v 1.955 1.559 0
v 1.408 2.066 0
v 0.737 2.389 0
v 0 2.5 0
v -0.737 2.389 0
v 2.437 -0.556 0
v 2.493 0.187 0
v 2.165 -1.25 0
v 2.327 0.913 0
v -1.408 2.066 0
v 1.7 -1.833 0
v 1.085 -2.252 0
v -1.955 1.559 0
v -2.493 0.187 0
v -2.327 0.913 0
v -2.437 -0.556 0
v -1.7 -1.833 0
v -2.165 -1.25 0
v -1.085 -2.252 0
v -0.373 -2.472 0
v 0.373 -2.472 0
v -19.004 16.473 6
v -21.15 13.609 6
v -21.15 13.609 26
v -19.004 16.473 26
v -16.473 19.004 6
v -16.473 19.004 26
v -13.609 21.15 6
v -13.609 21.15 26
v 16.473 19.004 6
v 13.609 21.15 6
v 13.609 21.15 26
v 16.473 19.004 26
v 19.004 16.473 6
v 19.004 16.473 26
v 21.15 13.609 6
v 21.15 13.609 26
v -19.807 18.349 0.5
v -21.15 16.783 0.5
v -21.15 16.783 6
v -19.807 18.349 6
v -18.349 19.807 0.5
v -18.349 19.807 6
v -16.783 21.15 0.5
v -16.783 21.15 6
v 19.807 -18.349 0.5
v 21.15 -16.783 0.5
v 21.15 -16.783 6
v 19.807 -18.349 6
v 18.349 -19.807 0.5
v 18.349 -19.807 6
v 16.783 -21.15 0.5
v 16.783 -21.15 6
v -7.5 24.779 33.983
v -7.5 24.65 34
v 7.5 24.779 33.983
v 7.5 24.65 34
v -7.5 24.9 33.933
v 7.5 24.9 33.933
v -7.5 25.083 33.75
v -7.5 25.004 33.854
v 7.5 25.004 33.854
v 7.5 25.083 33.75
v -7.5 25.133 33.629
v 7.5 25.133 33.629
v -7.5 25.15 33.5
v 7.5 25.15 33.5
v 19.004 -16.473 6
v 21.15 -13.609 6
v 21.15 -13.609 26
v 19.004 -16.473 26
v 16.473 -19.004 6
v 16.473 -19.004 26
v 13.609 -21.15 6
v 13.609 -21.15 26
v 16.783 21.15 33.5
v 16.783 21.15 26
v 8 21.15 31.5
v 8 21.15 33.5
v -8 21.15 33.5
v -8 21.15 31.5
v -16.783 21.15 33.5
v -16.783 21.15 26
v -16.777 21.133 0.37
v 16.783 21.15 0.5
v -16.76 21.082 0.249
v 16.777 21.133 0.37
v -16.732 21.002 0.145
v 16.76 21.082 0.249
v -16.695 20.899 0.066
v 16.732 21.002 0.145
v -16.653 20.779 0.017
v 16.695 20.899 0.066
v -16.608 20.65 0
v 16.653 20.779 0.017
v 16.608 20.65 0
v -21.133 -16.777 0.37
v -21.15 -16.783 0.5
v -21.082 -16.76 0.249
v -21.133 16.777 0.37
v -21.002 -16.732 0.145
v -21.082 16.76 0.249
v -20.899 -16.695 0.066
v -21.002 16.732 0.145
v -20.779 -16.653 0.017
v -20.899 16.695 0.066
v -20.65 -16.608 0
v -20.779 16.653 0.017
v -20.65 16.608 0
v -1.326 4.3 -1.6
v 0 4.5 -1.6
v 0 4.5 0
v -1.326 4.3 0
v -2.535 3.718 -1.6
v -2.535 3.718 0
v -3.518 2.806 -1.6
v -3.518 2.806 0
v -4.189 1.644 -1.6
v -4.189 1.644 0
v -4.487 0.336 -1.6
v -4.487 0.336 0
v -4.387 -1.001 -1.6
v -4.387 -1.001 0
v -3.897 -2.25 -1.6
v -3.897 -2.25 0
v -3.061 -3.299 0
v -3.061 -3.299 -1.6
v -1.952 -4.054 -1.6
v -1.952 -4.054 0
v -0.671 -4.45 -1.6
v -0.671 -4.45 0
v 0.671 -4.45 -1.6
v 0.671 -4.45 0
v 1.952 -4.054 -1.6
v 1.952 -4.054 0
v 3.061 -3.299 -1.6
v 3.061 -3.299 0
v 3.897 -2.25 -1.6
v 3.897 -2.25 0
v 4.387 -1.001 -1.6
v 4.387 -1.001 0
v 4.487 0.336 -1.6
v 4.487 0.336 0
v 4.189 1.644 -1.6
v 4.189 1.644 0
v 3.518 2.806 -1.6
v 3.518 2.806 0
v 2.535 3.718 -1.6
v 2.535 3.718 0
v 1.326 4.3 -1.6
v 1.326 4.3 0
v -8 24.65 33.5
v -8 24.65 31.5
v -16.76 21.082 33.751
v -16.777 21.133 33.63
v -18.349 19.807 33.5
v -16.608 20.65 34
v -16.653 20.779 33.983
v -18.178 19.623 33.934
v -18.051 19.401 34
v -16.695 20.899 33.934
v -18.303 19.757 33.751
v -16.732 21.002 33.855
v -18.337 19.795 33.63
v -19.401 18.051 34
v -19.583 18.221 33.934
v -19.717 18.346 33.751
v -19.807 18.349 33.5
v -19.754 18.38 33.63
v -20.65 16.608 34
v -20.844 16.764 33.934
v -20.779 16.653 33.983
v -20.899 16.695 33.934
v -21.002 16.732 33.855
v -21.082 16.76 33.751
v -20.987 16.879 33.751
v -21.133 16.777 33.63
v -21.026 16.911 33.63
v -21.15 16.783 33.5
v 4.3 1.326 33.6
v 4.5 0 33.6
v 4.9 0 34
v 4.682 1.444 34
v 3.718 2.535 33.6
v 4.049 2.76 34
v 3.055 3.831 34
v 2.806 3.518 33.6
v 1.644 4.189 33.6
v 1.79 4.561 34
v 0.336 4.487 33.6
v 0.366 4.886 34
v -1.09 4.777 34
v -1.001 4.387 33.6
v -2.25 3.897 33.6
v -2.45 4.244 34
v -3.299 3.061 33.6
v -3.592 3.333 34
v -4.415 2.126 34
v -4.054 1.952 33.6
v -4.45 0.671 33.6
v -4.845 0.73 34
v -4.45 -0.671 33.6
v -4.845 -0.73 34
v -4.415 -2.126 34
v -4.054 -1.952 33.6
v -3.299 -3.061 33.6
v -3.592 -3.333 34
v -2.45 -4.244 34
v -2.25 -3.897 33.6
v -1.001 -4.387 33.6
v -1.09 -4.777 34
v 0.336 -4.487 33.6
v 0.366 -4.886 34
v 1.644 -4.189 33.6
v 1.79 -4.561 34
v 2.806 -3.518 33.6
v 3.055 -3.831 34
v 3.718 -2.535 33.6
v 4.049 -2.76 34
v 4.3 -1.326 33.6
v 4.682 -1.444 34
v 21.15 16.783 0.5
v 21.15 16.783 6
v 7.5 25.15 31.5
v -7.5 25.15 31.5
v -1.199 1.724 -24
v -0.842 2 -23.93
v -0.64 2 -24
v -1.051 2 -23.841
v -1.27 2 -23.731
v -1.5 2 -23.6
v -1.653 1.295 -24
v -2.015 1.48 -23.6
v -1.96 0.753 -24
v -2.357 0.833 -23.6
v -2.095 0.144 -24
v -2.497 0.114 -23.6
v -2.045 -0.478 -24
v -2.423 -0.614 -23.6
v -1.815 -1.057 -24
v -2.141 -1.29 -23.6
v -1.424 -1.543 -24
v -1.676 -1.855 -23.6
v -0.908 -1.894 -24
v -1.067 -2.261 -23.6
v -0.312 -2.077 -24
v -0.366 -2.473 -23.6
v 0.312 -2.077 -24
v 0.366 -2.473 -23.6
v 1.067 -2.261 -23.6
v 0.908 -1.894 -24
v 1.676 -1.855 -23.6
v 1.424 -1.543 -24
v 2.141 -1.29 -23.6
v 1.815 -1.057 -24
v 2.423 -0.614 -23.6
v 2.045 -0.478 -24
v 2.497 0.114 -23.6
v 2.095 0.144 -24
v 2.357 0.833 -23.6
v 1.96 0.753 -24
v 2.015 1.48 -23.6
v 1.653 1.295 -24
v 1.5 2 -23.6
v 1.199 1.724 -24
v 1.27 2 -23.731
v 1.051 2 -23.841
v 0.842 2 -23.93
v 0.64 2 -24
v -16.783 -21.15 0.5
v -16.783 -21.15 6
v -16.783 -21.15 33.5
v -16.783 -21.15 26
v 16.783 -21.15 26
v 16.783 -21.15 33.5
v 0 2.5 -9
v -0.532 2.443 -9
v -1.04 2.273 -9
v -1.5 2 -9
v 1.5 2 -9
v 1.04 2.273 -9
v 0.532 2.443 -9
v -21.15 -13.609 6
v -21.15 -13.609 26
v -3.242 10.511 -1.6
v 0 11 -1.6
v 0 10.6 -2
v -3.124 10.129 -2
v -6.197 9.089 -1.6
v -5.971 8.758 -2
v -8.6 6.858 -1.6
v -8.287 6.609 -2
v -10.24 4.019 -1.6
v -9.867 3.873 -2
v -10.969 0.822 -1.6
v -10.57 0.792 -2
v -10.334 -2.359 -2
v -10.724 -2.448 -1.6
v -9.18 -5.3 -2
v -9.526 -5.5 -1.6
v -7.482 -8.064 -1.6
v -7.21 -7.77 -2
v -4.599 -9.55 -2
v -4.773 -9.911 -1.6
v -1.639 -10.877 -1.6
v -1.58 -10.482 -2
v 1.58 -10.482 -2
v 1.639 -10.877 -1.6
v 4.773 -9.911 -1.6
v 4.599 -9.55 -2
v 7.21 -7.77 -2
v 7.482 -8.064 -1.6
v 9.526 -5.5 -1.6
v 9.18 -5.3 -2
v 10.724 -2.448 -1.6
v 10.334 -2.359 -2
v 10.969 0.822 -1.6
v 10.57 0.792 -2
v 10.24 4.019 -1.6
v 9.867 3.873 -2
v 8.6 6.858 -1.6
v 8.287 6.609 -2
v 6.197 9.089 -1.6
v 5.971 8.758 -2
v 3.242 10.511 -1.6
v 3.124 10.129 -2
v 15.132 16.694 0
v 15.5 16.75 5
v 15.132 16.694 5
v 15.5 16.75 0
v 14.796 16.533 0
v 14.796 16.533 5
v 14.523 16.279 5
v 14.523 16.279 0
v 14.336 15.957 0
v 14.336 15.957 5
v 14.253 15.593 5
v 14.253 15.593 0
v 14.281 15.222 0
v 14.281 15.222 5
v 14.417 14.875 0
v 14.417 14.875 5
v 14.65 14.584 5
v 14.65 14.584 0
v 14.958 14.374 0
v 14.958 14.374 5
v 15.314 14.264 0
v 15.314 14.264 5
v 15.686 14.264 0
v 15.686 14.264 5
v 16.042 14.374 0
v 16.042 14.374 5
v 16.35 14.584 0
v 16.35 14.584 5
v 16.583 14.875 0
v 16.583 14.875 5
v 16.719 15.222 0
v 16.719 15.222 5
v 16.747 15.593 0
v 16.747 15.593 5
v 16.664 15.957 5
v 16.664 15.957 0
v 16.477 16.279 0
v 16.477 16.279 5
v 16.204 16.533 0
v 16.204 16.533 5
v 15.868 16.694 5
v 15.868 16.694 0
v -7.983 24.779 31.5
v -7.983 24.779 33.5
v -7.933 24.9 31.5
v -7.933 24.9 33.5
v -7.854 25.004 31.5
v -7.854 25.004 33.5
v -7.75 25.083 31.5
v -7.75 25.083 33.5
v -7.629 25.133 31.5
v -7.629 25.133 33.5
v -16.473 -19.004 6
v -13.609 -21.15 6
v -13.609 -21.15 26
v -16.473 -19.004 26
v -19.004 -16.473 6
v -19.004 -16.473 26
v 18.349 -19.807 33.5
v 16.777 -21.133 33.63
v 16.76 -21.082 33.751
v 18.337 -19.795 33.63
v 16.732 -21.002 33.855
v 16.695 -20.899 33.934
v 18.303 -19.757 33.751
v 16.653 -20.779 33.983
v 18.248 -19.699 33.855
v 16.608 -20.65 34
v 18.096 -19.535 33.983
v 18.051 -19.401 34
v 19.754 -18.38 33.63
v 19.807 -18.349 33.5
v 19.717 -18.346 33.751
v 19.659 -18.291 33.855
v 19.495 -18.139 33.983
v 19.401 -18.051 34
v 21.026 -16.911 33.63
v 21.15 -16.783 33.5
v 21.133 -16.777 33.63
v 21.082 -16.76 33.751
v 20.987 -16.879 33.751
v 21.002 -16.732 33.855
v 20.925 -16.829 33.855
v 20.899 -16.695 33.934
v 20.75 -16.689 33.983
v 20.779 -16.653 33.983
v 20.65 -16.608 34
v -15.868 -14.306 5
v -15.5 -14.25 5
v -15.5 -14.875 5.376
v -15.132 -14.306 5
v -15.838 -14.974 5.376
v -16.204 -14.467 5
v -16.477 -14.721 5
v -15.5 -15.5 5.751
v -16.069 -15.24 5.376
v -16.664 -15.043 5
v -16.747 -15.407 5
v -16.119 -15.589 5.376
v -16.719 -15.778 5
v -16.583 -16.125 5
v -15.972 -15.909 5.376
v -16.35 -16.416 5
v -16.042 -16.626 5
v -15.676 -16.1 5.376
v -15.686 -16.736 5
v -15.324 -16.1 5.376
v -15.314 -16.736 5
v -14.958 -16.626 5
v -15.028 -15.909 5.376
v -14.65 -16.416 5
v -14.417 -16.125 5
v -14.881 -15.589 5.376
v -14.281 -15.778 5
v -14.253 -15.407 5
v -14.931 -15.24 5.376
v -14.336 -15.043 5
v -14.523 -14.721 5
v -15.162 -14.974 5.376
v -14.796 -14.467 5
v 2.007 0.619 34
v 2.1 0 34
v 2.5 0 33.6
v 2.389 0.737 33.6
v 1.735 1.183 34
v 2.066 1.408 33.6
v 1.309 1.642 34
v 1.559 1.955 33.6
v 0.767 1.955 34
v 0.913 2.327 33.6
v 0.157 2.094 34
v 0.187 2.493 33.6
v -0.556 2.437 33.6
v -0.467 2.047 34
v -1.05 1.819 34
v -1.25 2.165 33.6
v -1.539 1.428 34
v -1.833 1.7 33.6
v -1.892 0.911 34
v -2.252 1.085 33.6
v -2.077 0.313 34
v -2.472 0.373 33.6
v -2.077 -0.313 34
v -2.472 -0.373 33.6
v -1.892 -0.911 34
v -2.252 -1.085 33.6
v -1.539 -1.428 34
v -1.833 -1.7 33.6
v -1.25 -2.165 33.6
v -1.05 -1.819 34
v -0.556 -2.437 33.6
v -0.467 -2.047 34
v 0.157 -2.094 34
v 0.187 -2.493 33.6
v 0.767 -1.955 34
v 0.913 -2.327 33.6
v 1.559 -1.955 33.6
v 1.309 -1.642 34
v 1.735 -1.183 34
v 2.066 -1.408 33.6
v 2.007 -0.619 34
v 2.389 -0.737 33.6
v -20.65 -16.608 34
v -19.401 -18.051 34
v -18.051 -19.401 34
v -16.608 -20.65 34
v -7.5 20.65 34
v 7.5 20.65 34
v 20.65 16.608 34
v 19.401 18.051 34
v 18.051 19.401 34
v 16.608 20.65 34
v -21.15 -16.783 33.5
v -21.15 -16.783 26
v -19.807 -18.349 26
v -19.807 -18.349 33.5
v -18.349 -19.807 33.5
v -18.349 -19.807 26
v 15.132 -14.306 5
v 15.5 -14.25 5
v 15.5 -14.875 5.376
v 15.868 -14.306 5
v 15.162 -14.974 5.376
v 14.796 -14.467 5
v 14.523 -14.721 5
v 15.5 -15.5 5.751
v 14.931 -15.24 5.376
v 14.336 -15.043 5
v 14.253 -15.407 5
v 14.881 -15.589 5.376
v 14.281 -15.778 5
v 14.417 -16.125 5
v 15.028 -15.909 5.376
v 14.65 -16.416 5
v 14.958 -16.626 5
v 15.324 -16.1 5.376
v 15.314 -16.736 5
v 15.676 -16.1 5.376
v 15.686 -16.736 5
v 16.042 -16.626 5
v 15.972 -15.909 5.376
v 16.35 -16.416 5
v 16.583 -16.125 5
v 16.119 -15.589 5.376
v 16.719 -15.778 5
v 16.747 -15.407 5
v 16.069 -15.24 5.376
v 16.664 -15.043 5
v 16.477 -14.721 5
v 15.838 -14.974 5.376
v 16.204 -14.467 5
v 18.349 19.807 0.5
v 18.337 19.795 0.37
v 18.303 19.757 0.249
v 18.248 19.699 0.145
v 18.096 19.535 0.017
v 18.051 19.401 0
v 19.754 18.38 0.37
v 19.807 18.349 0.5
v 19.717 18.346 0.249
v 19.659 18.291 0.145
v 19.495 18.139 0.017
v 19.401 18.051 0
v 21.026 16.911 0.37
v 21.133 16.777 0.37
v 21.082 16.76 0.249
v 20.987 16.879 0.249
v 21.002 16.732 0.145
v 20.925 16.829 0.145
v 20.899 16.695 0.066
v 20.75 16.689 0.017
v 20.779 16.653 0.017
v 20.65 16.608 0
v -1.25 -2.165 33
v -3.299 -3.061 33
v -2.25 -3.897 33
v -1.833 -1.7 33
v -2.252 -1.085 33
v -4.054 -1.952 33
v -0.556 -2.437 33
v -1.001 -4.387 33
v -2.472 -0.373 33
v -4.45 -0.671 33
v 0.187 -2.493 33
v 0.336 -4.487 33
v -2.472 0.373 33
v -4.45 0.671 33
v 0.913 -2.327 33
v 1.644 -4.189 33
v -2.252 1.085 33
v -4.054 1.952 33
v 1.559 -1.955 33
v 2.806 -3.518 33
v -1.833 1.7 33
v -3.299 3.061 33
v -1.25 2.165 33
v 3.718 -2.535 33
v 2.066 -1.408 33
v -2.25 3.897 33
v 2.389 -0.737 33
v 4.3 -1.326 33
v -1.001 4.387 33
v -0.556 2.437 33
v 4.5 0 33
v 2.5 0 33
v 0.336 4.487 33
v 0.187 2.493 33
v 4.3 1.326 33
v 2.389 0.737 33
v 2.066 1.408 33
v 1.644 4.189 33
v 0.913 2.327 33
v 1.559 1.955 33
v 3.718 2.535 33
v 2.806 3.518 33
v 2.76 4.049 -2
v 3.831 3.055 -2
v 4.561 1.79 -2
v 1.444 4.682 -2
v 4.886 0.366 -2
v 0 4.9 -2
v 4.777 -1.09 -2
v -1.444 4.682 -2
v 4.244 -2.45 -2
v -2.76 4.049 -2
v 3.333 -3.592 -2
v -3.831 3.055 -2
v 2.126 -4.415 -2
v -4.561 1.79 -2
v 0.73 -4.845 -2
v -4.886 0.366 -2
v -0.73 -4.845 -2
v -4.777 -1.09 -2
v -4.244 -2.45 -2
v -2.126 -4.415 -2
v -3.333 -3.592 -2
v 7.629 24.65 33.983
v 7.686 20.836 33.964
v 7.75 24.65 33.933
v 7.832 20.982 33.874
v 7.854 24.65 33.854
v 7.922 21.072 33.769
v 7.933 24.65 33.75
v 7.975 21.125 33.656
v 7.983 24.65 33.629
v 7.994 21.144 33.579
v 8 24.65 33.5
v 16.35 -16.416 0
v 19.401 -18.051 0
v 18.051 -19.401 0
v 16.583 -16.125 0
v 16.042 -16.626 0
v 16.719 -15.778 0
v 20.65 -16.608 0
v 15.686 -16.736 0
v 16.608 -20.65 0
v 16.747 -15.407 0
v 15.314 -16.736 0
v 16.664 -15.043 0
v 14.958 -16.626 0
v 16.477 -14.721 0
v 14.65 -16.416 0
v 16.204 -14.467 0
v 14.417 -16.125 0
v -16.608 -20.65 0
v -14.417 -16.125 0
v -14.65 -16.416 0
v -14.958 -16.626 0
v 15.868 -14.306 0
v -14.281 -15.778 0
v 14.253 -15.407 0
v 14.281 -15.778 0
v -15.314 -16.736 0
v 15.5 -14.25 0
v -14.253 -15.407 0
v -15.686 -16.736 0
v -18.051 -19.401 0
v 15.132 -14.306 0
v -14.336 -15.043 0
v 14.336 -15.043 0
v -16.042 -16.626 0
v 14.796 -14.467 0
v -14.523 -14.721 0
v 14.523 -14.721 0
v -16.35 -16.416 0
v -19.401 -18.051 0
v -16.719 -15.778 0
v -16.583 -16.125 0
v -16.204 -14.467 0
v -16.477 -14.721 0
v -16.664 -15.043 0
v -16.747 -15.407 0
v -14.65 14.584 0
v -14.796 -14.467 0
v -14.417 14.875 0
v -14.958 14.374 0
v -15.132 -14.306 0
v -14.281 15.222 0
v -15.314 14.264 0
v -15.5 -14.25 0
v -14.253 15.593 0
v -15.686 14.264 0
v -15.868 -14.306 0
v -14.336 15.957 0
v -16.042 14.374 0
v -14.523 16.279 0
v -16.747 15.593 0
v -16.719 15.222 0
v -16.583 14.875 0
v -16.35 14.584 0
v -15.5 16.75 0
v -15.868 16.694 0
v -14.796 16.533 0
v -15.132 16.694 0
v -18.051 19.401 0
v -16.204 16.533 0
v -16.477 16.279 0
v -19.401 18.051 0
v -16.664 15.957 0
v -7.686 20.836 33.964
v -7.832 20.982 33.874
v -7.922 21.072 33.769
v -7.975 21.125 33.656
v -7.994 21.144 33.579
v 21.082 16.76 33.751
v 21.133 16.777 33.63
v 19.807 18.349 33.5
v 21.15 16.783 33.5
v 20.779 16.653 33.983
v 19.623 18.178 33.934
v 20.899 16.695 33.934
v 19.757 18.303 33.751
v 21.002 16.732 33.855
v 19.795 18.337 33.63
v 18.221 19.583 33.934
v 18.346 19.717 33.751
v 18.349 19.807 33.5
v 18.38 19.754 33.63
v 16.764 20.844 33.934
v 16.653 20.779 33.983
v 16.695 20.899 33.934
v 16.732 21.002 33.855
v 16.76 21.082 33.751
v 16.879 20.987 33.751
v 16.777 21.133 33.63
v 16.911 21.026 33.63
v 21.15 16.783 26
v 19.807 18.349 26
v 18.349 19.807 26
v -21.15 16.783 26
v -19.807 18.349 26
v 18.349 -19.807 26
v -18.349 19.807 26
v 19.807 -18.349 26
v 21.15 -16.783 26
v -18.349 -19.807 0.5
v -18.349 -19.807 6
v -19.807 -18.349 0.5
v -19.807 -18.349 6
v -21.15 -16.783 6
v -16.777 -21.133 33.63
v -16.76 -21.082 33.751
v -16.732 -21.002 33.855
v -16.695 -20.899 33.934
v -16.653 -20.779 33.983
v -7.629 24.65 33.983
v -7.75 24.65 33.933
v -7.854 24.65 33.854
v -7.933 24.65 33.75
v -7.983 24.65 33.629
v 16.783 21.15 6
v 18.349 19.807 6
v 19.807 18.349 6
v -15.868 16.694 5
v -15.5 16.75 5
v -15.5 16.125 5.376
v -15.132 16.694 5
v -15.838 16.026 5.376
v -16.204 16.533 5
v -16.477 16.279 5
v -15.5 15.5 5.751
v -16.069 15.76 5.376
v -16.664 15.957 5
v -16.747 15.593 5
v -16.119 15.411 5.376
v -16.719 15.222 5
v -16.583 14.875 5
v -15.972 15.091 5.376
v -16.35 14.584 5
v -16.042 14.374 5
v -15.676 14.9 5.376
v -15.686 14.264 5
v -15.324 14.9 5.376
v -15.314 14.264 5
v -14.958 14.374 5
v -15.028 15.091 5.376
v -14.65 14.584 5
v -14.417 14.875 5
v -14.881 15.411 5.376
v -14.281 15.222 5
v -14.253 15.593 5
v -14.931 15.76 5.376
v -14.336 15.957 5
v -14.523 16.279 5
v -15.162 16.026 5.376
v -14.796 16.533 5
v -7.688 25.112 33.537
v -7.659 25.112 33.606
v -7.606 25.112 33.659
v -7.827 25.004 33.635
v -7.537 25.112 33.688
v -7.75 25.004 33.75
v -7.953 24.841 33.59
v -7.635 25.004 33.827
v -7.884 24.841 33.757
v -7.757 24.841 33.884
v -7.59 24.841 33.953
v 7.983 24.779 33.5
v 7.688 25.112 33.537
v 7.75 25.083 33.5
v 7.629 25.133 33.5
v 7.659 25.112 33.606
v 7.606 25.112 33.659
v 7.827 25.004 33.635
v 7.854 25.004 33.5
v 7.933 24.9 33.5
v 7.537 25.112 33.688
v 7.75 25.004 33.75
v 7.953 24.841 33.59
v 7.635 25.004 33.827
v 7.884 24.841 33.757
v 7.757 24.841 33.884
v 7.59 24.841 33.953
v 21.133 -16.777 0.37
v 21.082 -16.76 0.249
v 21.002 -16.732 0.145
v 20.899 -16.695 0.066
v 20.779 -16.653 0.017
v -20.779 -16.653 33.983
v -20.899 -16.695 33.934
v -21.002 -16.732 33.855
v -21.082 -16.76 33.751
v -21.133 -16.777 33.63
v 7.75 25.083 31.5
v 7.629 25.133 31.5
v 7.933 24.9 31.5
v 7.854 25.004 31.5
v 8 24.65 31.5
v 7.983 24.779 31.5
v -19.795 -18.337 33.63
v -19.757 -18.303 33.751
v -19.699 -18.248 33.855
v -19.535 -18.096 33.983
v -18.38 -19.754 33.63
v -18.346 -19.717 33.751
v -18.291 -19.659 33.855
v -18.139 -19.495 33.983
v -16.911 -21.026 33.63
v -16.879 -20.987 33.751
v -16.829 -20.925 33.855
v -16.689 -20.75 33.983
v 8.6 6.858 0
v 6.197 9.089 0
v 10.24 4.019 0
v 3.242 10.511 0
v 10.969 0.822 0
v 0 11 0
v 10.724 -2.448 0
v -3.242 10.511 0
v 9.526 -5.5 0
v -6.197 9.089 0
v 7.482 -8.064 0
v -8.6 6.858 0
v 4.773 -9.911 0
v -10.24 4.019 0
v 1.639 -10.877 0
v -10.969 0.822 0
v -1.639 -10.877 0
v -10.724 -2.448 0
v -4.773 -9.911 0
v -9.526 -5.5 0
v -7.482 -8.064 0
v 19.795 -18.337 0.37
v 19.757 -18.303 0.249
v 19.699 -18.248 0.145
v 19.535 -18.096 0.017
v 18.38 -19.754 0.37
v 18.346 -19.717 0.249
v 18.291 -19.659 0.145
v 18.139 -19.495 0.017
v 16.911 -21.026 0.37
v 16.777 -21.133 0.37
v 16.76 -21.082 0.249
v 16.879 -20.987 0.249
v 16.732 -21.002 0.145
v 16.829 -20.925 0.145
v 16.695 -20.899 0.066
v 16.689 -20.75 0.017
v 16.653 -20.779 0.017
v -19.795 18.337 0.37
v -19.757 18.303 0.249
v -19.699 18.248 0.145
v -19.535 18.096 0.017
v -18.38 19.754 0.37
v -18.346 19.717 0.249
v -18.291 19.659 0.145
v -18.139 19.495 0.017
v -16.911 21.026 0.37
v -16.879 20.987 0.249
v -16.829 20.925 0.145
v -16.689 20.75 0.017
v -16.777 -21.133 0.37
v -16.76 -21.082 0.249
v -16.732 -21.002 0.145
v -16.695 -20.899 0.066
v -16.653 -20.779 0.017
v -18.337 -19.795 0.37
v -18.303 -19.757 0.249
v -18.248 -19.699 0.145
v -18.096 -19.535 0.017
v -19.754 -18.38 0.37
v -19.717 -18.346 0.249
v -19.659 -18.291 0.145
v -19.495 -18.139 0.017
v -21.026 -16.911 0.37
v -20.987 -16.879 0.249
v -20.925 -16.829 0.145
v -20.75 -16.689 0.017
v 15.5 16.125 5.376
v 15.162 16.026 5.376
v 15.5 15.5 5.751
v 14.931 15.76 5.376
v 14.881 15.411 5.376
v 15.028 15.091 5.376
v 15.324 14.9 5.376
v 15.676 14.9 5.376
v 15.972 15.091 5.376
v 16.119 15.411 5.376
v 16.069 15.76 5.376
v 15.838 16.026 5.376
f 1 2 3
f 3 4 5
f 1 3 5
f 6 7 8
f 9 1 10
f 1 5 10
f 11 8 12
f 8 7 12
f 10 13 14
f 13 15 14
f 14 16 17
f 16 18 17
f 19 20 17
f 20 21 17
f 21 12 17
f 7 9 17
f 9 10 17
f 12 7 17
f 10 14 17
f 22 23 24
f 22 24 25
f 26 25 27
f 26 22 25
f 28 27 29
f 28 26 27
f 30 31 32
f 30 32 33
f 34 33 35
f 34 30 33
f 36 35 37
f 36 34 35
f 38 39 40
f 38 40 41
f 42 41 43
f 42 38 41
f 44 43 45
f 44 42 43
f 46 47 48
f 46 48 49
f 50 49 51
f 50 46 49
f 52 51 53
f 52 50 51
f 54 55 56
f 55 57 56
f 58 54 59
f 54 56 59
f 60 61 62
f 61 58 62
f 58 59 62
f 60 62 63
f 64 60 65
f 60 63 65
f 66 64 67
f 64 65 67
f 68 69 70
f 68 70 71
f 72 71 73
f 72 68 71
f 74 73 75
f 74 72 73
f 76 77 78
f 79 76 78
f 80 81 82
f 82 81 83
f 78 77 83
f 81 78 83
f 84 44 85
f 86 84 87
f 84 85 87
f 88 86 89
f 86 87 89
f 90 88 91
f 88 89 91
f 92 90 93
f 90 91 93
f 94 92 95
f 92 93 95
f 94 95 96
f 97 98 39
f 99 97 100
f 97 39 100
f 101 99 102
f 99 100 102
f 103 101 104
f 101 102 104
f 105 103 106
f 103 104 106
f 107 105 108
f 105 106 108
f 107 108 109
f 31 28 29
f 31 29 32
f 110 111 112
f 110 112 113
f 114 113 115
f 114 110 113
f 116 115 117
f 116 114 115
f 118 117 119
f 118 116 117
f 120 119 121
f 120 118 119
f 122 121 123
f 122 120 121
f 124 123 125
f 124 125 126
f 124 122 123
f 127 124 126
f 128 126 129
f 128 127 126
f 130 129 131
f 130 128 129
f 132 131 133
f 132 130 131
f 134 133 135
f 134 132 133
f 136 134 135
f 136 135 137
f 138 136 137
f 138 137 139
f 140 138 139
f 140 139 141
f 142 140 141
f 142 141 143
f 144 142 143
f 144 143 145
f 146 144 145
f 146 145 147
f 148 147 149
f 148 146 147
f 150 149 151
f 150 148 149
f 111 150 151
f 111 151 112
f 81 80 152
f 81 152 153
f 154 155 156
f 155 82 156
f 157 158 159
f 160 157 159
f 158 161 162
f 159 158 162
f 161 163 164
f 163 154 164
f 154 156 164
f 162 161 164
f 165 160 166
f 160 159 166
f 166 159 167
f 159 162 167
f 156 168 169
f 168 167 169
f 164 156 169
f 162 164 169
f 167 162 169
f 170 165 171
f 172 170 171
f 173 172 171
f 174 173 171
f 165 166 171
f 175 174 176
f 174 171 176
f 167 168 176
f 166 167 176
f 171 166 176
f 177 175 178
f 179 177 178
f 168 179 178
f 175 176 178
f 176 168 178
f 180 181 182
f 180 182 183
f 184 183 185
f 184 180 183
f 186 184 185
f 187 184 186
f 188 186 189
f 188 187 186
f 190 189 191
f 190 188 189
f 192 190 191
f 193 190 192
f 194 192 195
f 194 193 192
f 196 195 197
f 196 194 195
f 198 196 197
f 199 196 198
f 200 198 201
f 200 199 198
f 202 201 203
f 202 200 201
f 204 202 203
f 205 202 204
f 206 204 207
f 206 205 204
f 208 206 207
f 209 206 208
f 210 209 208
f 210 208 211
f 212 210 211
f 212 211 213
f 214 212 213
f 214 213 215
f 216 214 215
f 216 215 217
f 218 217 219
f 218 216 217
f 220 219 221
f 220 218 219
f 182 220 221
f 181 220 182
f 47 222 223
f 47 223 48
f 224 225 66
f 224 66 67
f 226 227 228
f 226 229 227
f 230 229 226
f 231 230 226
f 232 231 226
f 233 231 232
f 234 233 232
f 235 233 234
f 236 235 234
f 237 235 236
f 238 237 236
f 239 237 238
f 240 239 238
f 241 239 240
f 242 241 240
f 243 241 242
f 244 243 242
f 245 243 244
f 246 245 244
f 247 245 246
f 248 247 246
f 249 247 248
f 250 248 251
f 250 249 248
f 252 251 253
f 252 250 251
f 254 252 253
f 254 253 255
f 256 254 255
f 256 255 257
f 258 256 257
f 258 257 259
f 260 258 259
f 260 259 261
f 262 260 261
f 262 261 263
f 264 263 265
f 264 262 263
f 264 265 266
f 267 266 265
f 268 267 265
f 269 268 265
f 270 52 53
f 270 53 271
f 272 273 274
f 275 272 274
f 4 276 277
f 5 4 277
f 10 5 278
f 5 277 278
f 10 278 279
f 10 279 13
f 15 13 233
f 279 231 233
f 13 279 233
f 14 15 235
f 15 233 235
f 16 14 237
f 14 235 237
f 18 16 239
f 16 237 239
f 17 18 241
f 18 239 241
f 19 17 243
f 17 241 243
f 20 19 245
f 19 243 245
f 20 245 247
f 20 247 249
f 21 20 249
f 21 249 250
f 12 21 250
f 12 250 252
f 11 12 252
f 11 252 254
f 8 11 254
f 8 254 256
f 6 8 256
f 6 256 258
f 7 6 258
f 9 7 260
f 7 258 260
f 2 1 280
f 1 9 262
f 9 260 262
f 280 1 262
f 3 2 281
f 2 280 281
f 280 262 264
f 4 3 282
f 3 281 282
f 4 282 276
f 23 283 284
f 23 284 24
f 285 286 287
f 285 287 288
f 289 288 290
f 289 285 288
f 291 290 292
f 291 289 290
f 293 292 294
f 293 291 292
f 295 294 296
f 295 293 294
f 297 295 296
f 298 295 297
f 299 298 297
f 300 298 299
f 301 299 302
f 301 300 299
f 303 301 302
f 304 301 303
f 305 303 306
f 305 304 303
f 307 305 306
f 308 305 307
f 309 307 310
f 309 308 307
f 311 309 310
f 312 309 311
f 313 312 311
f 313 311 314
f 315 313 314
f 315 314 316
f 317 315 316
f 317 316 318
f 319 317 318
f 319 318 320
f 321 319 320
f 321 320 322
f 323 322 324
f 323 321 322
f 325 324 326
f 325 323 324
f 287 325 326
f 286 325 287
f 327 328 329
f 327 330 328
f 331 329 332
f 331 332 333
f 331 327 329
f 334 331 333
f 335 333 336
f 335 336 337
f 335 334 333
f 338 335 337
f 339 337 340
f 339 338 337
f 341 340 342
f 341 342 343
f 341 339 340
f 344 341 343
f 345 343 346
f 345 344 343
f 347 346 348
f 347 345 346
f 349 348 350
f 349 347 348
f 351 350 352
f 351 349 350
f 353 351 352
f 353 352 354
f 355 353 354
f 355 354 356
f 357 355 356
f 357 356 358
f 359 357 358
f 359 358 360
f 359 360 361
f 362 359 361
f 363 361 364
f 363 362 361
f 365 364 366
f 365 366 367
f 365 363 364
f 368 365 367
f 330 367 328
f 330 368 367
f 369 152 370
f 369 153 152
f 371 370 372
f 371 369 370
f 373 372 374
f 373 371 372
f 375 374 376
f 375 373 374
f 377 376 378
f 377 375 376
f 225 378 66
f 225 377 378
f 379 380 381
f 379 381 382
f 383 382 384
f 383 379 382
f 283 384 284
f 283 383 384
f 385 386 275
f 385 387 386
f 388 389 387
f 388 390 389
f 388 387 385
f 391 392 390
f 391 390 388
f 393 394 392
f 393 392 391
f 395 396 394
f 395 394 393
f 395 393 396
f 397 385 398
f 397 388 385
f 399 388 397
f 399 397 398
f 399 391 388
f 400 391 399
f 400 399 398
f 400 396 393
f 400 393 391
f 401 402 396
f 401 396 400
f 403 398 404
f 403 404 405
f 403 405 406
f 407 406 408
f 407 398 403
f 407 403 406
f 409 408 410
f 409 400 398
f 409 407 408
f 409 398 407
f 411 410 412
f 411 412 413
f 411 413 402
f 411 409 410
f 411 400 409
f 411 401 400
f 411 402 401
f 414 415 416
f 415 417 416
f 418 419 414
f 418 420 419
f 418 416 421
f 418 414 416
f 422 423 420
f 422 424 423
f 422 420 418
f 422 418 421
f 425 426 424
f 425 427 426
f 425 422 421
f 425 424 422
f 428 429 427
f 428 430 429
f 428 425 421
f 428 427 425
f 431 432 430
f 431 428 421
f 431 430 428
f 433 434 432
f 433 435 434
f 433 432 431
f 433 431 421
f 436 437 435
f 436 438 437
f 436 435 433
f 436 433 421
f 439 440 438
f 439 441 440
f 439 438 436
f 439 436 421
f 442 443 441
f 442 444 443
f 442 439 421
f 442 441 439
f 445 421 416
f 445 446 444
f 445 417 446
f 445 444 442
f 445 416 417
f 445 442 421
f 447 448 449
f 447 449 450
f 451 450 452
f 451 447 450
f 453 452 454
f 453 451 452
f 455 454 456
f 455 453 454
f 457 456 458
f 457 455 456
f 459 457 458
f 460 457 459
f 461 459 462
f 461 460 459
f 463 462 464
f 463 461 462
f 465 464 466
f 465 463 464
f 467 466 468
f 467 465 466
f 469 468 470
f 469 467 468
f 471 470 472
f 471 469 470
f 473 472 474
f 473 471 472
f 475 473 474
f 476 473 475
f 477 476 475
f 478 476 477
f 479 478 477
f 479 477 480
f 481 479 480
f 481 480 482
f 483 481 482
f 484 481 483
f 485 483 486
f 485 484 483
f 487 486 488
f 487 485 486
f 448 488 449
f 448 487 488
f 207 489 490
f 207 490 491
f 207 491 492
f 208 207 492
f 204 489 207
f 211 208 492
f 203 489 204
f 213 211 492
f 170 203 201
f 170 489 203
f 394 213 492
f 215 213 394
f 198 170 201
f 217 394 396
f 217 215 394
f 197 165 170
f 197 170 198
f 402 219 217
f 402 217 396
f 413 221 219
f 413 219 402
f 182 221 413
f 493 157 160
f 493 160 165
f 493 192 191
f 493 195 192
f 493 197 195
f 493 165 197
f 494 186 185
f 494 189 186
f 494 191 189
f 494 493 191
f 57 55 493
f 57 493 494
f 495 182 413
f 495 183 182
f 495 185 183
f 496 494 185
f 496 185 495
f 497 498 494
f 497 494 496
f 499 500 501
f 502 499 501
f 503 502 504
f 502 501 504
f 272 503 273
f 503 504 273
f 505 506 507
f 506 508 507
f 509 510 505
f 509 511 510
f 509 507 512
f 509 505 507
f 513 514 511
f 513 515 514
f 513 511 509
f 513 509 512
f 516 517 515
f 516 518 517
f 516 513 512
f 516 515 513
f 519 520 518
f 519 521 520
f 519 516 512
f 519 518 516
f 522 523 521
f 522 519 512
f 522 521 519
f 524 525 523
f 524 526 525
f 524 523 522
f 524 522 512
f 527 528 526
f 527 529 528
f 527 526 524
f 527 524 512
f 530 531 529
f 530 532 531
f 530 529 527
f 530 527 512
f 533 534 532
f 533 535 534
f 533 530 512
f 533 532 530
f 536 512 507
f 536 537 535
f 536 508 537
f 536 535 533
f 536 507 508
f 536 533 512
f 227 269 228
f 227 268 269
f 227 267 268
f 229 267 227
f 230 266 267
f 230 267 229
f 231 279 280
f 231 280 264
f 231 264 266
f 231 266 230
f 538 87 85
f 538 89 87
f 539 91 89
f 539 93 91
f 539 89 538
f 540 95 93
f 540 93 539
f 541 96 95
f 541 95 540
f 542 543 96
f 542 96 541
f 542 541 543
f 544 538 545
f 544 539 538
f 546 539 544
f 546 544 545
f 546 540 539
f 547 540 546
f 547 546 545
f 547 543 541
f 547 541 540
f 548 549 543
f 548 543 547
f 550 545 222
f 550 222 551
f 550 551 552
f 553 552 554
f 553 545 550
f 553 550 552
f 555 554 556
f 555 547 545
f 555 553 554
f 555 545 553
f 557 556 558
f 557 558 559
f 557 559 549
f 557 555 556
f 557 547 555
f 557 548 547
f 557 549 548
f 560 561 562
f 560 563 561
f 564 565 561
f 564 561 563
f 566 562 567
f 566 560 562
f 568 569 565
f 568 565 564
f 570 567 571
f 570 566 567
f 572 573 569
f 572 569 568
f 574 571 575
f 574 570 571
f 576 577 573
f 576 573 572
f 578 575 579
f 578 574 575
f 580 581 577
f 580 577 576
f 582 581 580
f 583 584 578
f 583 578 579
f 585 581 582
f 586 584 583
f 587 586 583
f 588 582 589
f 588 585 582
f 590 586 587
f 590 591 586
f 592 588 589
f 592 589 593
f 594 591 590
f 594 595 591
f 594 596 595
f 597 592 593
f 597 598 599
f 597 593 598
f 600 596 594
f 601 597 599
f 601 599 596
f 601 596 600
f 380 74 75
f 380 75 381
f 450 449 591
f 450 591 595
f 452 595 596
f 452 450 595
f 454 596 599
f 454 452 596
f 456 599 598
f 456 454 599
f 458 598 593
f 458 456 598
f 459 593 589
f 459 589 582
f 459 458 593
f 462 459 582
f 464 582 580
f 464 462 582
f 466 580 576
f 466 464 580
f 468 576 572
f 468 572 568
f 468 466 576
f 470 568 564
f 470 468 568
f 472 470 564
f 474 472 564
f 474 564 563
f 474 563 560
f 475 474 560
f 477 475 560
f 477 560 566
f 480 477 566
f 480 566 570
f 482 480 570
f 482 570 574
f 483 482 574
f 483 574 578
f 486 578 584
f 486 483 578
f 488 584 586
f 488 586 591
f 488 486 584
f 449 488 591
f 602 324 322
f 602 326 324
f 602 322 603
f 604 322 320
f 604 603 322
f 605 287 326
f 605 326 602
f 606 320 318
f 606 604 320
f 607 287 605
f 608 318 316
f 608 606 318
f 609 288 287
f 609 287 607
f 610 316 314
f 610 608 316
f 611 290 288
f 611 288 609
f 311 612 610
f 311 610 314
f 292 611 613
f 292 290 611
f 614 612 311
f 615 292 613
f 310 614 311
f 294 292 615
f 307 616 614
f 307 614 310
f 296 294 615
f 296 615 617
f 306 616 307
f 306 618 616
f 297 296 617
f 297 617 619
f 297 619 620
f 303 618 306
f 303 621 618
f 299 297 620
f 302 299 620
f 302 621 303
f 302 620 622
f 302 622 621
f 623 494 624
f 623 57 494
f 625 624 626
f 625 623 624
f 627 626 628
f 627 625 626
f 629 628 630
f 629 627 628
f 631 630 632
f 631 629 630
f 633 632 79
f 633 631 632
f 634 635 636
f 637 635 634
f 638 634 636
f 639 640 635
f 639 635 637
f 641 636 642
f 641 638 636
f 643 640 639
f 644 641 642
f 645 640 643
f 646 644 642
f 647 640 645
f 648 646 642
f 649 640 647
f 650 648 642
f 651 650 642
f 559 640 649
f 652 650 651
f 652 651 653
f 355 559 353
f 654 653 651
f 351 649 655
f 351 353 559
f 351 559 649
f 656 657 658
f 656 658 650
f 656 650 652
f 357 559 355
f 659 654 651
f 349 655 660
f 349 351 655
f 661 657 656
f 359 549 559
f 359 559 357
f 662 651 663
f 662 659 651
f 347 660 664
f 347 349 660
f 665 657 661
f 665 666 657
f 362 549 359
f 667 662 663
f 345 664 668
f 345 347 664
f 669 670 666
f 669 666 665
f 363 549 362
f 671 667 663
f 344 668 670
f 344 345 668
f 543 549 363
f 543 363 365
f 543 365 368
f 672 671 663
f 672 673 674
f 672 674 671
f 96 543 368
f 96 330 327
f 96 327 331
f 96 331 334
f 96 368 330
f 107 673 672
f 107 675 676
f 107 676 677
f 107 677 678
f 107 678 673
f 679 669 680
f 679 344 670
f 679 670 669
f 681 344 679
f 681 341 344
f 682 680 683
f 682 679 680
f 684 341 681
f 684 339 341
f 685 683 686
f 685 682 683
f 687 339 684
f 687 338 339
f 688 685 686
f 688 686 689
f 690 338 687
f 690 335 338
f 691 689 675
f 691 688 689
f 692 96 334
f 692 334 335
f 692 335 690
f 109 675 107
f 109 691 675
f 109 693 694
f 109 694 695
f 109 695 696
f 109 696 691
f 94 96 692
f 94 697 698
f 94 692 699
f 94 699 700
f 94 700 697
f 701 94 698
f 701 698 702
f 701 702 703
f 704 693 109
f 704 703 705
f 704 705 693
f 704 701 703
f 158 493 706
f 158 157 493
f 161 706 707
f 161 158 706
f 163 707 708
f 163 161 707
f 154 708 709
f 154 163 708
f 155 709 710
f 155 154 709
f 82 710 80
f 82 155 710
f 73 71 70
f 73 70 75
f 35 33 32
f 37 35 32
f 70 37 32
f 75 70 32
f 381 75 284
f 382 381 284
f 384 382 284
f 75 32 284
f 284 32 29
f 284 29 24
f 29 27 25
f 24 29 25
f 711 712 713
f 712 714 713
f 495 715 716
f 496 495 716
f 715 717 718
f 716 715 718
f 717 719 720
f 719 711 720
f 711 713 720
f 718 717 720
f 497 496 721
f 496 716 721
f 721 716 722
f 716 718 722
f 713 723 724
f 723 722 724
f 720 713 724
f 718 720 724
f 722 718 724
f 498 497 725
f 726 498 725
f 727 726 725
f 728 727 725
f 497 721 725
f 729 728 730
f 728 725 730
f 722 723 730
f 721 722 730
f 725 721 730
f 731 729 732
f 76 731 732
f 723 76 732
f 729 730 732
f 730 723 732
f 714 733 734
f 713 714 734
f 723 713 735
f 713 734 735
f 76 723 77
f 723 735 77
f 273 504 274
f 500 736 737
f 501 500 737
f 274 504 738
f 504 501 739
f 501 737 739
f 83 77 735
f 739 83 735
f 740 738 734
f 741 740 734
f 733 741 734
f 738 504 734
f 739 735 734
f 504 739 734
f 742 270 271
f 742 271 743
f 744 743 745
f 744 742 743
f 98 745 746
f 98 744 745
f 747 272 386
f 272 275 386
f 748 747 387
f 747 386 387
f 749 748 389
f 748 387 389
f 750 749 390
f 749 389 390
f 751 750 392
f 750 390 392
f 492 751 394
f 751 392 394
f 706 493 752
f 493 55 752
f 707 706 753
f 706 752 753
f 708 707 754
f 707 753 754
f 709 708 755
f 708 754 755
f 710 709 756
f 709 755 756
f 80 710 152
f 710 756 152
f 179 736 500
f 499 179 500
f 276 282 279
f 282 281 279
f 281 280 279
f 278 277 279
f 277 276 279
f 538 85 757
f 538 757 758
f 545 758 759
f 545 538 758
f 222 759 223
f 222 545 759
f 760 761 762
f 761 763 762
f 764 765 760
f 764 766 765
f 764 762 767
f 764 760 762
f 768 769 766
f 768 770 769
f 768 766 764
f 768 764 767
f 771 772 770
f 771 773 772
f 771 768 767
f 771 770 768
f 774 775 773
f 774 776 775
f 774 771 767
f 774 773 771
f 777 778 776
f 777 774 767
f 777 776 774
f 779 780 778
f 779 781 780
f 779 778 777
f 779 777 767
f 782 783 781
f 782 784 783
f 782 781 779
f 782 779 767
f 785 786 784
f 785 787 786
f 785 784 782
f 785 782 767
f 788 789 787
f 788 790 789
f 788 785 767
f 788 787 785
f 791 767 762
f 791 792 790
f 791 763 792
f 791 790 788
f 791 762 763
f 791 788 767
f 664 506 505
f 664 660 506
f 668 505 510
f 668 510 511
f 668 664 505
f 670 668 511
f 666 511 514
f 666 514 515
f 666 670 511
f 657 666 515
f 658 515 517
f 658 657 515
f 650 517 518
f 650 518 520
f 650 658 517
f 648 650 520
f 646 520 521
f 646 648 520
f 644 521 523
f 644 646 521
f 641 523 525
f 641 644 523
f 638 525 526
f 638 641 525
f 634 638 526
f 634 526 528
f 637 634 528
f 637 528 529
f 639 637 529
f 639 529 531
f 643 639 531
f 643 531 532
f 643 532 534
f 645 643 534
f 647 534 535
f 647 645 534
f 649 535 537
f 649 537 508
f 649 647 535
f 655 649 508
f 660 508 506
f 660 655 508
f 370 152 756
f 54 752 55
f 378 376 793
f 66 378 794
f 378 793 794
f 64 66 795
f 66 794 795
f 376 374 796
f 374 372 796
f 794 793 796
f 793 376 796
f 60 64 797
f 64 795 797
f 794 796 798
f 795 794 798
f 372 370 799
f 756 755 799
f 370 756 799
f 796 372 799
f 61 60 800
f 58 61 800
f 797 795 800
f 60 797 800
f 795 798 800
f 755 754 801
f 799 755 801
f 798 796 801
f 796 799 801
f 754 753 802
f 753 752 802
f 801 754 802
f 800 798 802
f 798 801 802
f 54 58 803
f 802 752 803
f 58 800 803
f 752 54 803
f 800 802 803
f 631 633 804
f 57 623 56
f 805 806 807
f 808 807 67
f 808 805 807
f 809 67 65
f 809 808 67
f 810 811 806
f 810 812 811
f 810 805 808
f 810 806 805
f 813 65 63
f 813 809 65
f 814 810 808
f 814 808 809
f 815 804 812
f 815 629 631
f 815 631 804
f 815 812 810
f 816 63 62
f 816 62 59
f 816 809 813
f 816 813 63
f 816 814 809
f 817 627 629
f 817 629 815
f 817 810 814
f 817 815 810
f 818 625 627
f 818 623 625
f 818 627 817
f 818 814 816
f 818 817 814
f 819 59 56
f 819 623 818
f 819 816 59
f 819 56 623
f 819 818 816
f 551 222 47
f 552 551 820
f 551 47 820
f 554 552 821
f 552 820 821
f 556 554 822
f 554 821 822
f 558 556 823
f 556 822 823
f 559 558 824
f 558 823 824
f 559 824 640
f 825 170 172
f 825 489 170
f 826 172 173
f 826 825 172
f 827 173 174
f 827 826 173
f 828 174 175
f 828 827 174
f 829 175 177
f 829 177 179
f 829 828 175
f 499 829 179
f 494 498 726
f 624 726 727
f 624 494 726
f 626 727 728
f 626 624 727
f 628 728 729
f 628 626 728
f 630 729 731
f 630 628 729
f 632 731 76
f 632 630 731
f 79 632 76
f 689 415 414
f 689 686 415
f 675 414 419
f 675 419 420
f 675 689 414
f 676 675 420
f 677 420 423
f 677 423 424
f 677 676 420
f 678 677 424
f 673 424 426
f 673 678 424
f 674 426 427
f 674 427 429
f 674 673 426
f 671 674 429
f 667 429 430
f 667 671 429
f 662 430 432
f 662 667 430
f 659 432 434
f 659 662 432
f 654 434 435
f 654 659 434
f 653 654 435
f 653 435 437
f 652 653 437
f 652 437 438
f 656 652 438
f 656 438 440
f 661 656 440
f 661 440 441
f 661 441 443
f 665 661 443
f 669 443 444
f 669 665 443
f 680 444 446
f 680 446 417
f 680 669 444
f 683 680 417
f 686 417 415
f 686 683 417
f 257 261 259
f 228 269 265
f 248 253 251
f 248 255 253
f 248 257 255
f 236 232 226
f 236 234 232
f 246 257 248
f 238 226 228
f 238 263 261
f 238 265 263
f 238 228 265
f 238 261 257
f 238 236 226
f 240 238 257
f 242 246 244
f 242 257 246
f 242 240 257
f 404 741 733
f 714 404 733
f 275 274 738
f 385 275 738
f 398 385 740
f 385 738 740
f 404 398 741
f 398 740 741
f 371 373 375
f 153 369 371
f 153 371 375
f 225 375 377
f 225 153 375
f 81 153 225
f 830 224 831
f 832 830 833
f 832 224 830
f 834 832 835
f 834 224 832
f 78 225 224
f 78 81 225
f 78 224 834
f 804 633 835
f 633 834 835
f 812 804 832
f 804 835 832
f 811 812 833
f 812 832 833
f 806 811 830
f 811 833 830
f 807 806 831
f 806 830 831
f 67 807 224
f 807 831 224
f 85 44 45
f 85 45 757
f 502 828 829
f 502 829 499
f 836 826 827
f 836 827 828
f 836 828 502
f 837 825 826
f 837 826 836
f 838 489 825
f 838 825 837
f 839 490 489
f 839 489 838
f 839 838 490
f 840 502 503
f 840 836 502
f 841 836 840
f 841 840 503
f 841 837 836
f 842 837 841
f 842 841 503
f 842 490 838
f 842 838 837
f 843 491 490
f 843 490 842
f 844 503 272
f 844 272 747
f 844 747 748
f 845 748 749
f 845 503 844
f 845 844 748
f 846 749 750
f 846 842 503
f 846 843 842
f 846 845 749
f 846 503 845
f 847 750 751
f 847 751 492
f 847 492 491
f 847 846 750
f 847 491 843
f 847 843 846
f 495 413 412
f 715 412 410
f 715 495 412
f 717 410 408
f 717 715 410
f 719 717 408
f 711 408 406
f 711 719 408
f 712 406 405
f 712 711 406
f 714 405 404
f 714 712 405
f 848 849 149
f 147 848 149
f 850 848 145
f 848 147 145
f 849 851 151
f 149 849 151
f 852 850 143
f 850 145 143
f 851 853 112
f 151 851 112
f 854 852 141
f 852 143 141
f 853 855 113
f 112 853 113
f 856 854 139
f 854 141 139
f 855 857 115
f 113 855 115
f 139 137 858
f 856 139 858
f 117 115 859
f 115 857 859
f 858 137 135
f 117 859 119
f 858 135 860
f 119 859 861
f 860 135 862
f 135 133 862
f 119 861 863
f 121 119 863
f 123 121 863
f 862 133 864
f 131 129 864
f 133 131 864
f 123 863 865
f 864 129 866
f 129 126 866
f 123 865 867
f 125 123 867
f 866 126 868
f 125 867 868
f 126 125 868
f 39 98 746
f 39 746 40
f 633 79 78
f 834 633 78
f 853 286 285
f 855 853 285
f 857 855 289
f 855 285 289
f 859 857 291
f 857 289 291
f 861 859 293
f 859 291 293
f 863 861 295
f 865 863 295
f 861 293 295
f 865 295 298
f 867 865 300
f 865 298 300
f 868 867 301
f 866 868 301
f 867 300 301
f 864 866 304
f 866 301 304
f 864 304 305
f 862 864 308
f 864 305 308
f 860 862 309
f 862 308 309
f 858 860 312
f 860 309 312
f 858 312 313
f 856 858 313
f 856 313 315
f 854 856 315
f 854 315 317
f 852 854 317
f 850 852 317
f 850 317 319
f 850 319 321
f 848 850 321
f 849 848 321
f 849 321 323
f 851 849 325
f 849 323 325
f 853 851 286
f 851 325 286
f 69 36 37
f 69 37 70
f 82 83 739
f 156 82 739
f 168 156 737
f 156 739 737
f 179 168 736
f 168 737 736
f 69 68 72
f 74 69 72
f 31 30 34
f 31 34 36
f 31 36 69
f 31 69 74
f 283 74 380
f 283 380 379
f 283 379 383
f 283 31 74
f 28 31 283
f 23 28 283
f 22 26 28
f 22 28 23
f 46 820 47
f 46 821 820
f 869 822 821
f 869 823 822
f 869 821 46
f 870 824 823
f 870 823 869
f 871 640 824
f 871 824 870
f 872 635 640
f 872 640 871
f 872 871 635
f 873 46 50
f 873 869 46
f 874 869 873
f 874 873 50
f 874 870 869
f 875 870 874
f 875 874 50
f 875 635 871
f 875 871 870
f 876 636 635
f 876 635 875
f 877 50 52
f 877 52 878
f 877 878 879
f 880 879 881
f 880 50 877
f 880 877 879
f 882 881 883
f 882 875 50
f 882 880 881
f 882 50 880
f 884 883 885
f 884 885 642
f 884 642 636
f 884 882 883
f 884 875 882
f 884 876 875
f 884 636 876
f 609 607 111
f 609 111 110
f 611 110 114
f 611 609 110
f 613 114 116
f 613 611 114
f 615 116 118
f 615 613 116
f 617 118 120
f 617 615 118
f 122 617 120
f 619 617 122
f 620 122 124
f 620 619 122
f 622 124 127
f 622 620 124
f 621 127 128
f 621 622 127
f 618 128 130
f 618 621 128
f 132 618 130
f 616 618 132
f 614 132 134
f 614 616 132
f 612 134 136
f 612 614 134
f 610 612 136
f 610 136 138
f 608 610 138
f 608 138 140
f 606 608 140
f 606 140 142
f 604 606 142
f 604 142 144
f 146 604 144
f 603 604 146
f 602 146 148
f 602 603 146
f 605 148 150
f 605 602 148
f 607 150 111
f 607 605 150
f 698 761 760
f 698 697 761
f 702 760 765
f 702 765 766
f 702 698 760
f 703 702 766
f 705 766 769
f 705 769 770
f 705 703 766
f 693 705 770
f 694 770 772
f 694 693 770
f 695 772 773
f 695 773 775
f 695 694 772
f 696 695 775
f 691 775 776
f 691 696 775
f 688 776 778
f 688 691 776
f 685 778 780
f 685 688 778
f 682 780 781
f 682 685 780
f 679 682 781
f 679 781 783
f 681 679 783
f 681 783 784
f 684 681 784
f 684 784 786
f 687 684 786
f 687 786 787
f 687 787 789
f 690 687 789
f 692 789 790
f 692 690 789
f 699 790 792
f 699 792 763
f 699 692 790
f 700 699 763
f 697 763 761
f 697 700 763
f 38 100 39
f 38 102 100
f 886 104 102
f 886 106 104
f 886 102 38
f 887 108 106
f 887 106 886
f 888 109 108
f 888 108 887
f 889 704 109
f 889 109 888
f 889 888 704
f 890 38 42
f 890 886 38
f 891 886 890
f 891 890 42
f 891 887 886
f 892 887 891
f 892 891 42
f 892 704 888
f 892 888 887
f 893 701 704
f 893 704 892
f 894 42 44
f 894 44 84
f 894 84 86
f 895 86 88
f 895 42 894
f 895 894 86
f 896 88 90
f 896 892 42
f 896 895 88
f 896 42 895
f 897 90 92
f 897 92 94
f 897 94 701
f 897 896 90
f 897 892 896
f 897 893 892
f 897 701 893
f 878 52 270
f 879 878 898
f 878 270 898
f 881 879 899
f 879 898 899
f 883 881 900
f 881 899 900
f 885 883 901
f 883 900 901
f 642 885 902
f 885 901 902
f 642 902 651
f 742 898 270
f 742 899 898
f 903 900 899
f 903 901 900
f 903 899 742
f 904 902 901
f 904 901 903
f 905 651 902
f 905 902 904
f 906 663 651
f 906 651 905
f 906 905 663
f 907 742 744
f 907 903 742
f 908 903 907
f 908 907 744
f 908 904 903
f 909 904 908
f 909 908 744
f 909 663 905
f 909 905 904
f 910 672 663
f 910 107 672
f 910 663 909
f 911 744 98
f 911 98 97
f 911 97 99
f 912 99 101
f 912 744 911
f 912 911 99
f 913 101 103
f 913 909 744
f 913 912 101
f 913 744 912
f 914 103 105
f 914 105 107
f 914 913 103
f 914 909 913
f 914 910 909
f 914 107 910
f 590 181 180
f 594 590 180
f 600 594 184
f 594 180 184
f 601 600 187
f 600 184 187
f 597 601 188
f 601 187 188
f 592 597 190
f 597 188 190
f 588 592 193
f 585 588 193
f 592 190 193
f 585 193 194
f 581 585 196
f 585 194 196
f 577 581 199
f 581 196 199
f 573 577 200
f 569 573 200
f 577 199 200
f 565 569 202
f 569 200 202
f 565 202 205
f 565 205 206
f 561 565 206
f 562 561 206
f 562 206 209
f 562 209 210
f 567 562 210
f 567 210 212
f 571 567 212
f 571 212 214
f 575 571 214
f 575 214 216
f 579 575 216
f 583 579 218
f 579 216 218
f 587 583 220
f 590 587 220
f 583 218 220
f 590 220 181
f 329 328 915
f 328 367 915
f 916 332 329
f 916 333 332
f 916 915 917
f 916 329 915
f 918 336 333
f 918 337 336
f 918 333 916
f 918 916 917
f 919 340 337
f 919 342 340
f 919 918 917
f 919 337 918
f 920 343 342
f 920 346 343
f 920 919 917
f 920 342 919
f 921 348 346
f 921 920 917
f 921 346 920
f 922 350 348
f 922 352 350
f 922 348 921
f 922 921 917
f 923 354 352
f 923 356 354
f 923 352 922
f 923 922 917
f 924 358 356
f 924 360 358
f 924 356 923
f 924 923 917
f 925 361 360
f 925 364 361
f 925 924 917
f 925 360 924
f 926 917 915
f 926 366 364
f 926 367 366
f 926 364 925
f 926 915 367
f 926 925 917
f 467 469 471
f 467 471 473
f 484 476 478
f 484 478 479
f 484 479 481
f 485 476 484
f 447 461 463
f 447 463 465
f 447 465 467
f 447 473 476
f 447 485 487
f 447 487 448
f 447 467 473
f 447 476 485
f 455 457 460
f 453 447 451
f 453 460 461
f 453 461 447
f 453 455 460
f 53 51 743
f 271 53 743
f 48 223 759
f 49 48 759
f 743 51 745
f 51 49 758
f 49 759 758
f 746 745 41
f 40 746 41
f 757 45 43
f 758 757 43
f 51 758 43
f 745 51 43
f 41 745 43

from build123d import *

# Parameters (mm, degrees)
BOSS_EXTRU_1_DEPTH           = 6
BOSS_EXTRU_2_DEPTH           = 20
BOSS_EXTRU_3_DEPTH           = 8
ESQUISSE4_W                  = 16
ESQUISSE4_H                  = 2.5
BOSS_EXTRU_4_DEPTH           = 4
ESQUISSE5_W                  = 2
ESQUISSE5_H                  = 6.5
ESQUISSE5_W_2                = 24
ESQUISSE5_H_2                = 2.5
CONG_1_R                     = 0.5
CONG_2_R                     = 0.5
CHANFREIN1_SIZE              = 0.4
CHANFREIN2_SIZE              = 0.4
ESQUISSE6_W                  = 15
ESQUISSE6_H                  = 0.5
ENL_V_MAT_EXTRU_1_DEPTH      = 22.1500001
ENL_V_MAT_EXTRU_1_DEPTH_BACK = 22.1500001
ESQUISSE7_R                  = 4.5
ESQUISSE7_R_2                = 2.5
ENL_V_MAT_EXTRU_2_DEPTH      = 1
CHANFREIN3_SIZE              = 0.4
TROU_TARAUD_M31_AT_2_COUNT   = 2
TROU_TARAUD_M31_AT_2_PITCH   = 31
TROU_TARAUD_M31_AT_3_COUNT   = 2
TROU_TARAUD_M31_AT_3_PITCH   = 43.840620434
TROU_TARAUD_M31_AT_4_COUNT   = 2
TROU_TARAUD_M31_AT_4_PITCH   = 31


with BuildPart() as part:
    # Esquisse1 → Boss.-Extru.1 (new body)
    with BuildSketch(Plane.XY):
        with BuildLine():
            Line((21.15, 16.783250579), (21.15, -16.783250579))
            ThreePointArc((21.15, -16.783250579), (19.091883092, -19.091883092), (16.783250579, -21.15))
            Line((16.783250579, -21.15), (-16.783250579, -21.15))
            ThreePointArc((-16.783250579, -21.15), (-19.091883092, -19.091883092), (-21.15, -16.783250579))
            Line((-21.15, -16.783250579), (-21.15, 16.783250579))
            ThreePointArc((-21.15, 16.783250579), (-19.091883092, 19.091883092), (-16.783250579, 21.15))
            Line((-16.783250579, 21.15), (16.783250579, 21.15))
            ThreePointArc((16.783250579, 21.15), (19.091883092, 19.091883092), (21.15, 16.783250579))
        make_face()
    extrude(amount=BOSS_EXTRU_1_DEPTH)

    # Congé2
    cong_2_edges = [part.edges().sort_by_distance(p)[0] for p in [
        (0, 21.15, 0),
        (19.091883092, 19.091883092, 0),
        (21.15, 0, 0),
        (19.091883092, -19.091883092, 0),
        (0, -21.15, 0),
        (-19.091883092, -19.091883092, 0),
        (-21.15, 0, 0),
        (-19.091883092, 19.091883092, 0),
    ]]
    fillet(cong_2_edges, radius=CONG_2_R)

    # Esquisse9 → Trou taraudé M31 (revolve, cut)
    with BuildSketch(Plane(origin=(15.5, -15.5, 0), x_dir=(0, 1, 0), z_dir=(1, 0, 0))):
        Polygon((0, 0), (0, 5.751075774), (1.25, 5), (1.25, 0), align=None)
    trou_taraud_m31 = revolve(axis=Axis((15.5, -15.5, -6.35), (0, 0, 1)), mode=Mode.SUBTRACT)

    # Trou taraudé M31 at 2: Trou taraudé M31 ×2
    with Locations(*[(0, i * TROU_TARAUD_M31_AT_2_PITCH, 0) for i in range(1, TROU_TARAUD_M31_AT_2_COUNT)]):
        add(trou_taraud_m31, mode=Mode.SUBTRACT)

    # Trou taraudé M31 at 3: Trou taraudé M31 ×2
    with Locations(*[Vector(-0.707106781, 0.707106781, 0) * (i * TROU_TARAUD_M31_AT_3_PITCH) for i in range(1, TROU_TARAUD_M31_AT_3_COUNT)]):
        add(trou_taraud_m31, mode=Mode.SUBTRACT)

    # Trou taraudé M31 at 4: Trou taraudé M31 ×2
    with Locations(*[(-i * TROU_TARAUD_M31_AT_4_PITCH, 0, 0) for i in range(1, TROU_TARAUD_M31_AT_4_COUNT)]):
        add(trou_taraud_m31, mode=Mode.SUBTRACT)


with BuildPart() as body_2:
    # Esquisse2 → Boss.-Extru.2 (new body)
    with BuildSketch(Plane.XY.offset(6)):
        with BuildLine():
            Line((-13.608820669, 21.15), (13.608820669, 21.15))
            ThreePointArc((13.608820669, 21.15), (17.783735547, 17.783735547), (21.15, 13.608820669))
            Line((21.15, 13.608820669), (21.15, -13.608820669))
            ThreePointArc((21.15, -13.608820669), (17.783735547, -17.783735547), (13.608820669, -21.15))
            Line((13.608820669, -21.15), (-13.608820669, -21.15))
            ThreePointArc((-13.608820669, -21.15), (-17.783735547, -17.783735547), (-21.15, -13.608820669))
            Line((-21.15, -13.608820669), (-21.15, 13.608820669))
            ThreePointArc((-21.15, 13.608820669), (-17.783735547, 17.783735547), (-13.608820669, 21.15))
        make_face()
    extrude(amount=BOSS_EXTRU_2_DEPTH)


with BuildPart() as body_3:
    # Esquisse3 → Boss.-Extru.3 (new body)
    with BuildSketch(Plane.XY.offset(26)):
        with BuildLine():
            Line((-16.783250579, -21.15), (16.783250579, -21.15))
            ThreePointArc((16.783250579, -21.15), (19.091883092, -19.091883092), (21.15, -16.783250579))
            Line((21.15, -16.783250579), (21.15, 16.783250579))
            ThreePointArc((21.15, 16.783250579), (19.091883092, 19.091883092), (16.783250579, 21.15))
            Line((16.783250579, 21.15), (-16.783250579, 21.15))
            ThreePointArc((-16.783250579, 21.15), (-19.091883092, 19.091883092), (-21.15, 16.783250579))
            Line((-21.15, 16.783250579), (-21.15, -16.783250579))
            ThreePointArc((-21.15, -16.783250579), (-19.091883092, -19.091883092), (-16.783250579, -21.15))
        make_face()
    extrude(amount=BOSS_EXTRU_3_DEPTH)

    # Esquisse4 → Boss.-Extru.4 (add)
    with BuildSketch(Plane(origin=(0, 21.15, 0), x_dir=(1, 0, 0), z_dir=(0, 1, 0))):
        with Locations((0, -32.75)):
            Rectangle(ESQUISSE4_W, ESQUISSE4_H)
    extrude(amount=BOSS_EXTRU_4_DEPTH)

    # Congé1
    cong_1_edges = [body_3.edges().sort_by_distance(p)[0] for p in [
        (19.091883092, -19.091883092, 34),
        (21.15, 0, 34),
        (19.091883092, 19.091883092, 34),
        (12.39162529, 21.15, 34),
        (-19.091883092, 19.091883092, 34),
        (-12.39162529, 21.15, 34),
        (-21.15, 0, 34),
        (8, 23.15, 34),
        (-8, 23.15, 34),
        (8, 25.15, 32.75),
        (-8, 25.15, 32.75),
        (0, 25.15, 34),
        (-19.091883092, -19.091883092, 34),
        (0, -21.15, 34),
    ]]
    fillet(cong_1_edges, radius=CONG_1_R)

    # Esquisse7 → Enlèv. mat.-Extru.2 (cut)
    with BuildSketch(Plane.XY.offset(34)):
        Circle(ESQUISSE7_R)
        Circle(ESQUISSE7_R_2, mode=Mode.SUBTRACT)
    extrude(amount=-ENL_V_MAT_EXTRU_2_DEPTH, mode=Mode.SUBTRACT)

    # Chanfrein3
    chanfrein3_edges = [body_3.edges().sort_by_distance(p)[0] for p in [
        (-4.5, 0, 34),
        (-2.5, 0, 34),
    ]]
    chamfer(chanfrein3_edges, length=CHANFREIN3_SIZE)


with BuildPart() as body_4:
    # Esquisse5 → Révolution1 (revolve)
    with BuildSketch(Plane(origin=(0, 0, 0), x_dir=(0, 0, -1), z_dir=(1, 0, 0))):
        with Locations((1, 7.75)):
            Rectangle(ESQUISSE5_W, ESQUISSE5_H)
        with Locations((12, 1.25)):
            Rectangle(ESQUISSE5_W_2, ESQUISSE5_H_2)
    revolve(axis=Axis((0, 0, 0), (0, 0, 1)))

    # Chanfrein1
    chanfrein1_edges = [body_4.edges().sort_by_distance(p)[0] for p in [
        (0, -2.5, -24),
    ]]
    chamfer(chanfrein1_edges, length=CHANFREIN1_SIZE)

    # Chanfrein2
    chanfrein2_edges = [body_4.edges().sort_by_distance(p)[0] for p in [
        (0, -11, -2),
        (0, -4.5, -2),
    ]]
    chamfer(chanfrein2_edges, length=CHANFREIN2_SIZE)

    # Esquisse6 → Enlèv. mat.-Extru.1 (cut, two sides)
    with BuildSketch(Plane(origin=(0, 0, 0), x_dir=(0, 0, -1), z_dir=(1, 0, 0))) as enl_v_mat_extru_1_sk:
        with Locations((16.5, 2.25)):
            Rectangle(ESQUISSE6_W, ESQUISSE6_H)
    extrude(amount=ENL_V_MAT_EXTRU_1_DEPTH, mode=Mode.SUBTRACT)
    extrude(enl_v_mat_extru_1_sk.sketch, amount=-ENL_V_MAT_EXTRU_1_DEPTH_BACK, mode=Mode.SUBTRACT)


solid = Compound([part.part, body_2.part, body_3.part, body_4.part])
